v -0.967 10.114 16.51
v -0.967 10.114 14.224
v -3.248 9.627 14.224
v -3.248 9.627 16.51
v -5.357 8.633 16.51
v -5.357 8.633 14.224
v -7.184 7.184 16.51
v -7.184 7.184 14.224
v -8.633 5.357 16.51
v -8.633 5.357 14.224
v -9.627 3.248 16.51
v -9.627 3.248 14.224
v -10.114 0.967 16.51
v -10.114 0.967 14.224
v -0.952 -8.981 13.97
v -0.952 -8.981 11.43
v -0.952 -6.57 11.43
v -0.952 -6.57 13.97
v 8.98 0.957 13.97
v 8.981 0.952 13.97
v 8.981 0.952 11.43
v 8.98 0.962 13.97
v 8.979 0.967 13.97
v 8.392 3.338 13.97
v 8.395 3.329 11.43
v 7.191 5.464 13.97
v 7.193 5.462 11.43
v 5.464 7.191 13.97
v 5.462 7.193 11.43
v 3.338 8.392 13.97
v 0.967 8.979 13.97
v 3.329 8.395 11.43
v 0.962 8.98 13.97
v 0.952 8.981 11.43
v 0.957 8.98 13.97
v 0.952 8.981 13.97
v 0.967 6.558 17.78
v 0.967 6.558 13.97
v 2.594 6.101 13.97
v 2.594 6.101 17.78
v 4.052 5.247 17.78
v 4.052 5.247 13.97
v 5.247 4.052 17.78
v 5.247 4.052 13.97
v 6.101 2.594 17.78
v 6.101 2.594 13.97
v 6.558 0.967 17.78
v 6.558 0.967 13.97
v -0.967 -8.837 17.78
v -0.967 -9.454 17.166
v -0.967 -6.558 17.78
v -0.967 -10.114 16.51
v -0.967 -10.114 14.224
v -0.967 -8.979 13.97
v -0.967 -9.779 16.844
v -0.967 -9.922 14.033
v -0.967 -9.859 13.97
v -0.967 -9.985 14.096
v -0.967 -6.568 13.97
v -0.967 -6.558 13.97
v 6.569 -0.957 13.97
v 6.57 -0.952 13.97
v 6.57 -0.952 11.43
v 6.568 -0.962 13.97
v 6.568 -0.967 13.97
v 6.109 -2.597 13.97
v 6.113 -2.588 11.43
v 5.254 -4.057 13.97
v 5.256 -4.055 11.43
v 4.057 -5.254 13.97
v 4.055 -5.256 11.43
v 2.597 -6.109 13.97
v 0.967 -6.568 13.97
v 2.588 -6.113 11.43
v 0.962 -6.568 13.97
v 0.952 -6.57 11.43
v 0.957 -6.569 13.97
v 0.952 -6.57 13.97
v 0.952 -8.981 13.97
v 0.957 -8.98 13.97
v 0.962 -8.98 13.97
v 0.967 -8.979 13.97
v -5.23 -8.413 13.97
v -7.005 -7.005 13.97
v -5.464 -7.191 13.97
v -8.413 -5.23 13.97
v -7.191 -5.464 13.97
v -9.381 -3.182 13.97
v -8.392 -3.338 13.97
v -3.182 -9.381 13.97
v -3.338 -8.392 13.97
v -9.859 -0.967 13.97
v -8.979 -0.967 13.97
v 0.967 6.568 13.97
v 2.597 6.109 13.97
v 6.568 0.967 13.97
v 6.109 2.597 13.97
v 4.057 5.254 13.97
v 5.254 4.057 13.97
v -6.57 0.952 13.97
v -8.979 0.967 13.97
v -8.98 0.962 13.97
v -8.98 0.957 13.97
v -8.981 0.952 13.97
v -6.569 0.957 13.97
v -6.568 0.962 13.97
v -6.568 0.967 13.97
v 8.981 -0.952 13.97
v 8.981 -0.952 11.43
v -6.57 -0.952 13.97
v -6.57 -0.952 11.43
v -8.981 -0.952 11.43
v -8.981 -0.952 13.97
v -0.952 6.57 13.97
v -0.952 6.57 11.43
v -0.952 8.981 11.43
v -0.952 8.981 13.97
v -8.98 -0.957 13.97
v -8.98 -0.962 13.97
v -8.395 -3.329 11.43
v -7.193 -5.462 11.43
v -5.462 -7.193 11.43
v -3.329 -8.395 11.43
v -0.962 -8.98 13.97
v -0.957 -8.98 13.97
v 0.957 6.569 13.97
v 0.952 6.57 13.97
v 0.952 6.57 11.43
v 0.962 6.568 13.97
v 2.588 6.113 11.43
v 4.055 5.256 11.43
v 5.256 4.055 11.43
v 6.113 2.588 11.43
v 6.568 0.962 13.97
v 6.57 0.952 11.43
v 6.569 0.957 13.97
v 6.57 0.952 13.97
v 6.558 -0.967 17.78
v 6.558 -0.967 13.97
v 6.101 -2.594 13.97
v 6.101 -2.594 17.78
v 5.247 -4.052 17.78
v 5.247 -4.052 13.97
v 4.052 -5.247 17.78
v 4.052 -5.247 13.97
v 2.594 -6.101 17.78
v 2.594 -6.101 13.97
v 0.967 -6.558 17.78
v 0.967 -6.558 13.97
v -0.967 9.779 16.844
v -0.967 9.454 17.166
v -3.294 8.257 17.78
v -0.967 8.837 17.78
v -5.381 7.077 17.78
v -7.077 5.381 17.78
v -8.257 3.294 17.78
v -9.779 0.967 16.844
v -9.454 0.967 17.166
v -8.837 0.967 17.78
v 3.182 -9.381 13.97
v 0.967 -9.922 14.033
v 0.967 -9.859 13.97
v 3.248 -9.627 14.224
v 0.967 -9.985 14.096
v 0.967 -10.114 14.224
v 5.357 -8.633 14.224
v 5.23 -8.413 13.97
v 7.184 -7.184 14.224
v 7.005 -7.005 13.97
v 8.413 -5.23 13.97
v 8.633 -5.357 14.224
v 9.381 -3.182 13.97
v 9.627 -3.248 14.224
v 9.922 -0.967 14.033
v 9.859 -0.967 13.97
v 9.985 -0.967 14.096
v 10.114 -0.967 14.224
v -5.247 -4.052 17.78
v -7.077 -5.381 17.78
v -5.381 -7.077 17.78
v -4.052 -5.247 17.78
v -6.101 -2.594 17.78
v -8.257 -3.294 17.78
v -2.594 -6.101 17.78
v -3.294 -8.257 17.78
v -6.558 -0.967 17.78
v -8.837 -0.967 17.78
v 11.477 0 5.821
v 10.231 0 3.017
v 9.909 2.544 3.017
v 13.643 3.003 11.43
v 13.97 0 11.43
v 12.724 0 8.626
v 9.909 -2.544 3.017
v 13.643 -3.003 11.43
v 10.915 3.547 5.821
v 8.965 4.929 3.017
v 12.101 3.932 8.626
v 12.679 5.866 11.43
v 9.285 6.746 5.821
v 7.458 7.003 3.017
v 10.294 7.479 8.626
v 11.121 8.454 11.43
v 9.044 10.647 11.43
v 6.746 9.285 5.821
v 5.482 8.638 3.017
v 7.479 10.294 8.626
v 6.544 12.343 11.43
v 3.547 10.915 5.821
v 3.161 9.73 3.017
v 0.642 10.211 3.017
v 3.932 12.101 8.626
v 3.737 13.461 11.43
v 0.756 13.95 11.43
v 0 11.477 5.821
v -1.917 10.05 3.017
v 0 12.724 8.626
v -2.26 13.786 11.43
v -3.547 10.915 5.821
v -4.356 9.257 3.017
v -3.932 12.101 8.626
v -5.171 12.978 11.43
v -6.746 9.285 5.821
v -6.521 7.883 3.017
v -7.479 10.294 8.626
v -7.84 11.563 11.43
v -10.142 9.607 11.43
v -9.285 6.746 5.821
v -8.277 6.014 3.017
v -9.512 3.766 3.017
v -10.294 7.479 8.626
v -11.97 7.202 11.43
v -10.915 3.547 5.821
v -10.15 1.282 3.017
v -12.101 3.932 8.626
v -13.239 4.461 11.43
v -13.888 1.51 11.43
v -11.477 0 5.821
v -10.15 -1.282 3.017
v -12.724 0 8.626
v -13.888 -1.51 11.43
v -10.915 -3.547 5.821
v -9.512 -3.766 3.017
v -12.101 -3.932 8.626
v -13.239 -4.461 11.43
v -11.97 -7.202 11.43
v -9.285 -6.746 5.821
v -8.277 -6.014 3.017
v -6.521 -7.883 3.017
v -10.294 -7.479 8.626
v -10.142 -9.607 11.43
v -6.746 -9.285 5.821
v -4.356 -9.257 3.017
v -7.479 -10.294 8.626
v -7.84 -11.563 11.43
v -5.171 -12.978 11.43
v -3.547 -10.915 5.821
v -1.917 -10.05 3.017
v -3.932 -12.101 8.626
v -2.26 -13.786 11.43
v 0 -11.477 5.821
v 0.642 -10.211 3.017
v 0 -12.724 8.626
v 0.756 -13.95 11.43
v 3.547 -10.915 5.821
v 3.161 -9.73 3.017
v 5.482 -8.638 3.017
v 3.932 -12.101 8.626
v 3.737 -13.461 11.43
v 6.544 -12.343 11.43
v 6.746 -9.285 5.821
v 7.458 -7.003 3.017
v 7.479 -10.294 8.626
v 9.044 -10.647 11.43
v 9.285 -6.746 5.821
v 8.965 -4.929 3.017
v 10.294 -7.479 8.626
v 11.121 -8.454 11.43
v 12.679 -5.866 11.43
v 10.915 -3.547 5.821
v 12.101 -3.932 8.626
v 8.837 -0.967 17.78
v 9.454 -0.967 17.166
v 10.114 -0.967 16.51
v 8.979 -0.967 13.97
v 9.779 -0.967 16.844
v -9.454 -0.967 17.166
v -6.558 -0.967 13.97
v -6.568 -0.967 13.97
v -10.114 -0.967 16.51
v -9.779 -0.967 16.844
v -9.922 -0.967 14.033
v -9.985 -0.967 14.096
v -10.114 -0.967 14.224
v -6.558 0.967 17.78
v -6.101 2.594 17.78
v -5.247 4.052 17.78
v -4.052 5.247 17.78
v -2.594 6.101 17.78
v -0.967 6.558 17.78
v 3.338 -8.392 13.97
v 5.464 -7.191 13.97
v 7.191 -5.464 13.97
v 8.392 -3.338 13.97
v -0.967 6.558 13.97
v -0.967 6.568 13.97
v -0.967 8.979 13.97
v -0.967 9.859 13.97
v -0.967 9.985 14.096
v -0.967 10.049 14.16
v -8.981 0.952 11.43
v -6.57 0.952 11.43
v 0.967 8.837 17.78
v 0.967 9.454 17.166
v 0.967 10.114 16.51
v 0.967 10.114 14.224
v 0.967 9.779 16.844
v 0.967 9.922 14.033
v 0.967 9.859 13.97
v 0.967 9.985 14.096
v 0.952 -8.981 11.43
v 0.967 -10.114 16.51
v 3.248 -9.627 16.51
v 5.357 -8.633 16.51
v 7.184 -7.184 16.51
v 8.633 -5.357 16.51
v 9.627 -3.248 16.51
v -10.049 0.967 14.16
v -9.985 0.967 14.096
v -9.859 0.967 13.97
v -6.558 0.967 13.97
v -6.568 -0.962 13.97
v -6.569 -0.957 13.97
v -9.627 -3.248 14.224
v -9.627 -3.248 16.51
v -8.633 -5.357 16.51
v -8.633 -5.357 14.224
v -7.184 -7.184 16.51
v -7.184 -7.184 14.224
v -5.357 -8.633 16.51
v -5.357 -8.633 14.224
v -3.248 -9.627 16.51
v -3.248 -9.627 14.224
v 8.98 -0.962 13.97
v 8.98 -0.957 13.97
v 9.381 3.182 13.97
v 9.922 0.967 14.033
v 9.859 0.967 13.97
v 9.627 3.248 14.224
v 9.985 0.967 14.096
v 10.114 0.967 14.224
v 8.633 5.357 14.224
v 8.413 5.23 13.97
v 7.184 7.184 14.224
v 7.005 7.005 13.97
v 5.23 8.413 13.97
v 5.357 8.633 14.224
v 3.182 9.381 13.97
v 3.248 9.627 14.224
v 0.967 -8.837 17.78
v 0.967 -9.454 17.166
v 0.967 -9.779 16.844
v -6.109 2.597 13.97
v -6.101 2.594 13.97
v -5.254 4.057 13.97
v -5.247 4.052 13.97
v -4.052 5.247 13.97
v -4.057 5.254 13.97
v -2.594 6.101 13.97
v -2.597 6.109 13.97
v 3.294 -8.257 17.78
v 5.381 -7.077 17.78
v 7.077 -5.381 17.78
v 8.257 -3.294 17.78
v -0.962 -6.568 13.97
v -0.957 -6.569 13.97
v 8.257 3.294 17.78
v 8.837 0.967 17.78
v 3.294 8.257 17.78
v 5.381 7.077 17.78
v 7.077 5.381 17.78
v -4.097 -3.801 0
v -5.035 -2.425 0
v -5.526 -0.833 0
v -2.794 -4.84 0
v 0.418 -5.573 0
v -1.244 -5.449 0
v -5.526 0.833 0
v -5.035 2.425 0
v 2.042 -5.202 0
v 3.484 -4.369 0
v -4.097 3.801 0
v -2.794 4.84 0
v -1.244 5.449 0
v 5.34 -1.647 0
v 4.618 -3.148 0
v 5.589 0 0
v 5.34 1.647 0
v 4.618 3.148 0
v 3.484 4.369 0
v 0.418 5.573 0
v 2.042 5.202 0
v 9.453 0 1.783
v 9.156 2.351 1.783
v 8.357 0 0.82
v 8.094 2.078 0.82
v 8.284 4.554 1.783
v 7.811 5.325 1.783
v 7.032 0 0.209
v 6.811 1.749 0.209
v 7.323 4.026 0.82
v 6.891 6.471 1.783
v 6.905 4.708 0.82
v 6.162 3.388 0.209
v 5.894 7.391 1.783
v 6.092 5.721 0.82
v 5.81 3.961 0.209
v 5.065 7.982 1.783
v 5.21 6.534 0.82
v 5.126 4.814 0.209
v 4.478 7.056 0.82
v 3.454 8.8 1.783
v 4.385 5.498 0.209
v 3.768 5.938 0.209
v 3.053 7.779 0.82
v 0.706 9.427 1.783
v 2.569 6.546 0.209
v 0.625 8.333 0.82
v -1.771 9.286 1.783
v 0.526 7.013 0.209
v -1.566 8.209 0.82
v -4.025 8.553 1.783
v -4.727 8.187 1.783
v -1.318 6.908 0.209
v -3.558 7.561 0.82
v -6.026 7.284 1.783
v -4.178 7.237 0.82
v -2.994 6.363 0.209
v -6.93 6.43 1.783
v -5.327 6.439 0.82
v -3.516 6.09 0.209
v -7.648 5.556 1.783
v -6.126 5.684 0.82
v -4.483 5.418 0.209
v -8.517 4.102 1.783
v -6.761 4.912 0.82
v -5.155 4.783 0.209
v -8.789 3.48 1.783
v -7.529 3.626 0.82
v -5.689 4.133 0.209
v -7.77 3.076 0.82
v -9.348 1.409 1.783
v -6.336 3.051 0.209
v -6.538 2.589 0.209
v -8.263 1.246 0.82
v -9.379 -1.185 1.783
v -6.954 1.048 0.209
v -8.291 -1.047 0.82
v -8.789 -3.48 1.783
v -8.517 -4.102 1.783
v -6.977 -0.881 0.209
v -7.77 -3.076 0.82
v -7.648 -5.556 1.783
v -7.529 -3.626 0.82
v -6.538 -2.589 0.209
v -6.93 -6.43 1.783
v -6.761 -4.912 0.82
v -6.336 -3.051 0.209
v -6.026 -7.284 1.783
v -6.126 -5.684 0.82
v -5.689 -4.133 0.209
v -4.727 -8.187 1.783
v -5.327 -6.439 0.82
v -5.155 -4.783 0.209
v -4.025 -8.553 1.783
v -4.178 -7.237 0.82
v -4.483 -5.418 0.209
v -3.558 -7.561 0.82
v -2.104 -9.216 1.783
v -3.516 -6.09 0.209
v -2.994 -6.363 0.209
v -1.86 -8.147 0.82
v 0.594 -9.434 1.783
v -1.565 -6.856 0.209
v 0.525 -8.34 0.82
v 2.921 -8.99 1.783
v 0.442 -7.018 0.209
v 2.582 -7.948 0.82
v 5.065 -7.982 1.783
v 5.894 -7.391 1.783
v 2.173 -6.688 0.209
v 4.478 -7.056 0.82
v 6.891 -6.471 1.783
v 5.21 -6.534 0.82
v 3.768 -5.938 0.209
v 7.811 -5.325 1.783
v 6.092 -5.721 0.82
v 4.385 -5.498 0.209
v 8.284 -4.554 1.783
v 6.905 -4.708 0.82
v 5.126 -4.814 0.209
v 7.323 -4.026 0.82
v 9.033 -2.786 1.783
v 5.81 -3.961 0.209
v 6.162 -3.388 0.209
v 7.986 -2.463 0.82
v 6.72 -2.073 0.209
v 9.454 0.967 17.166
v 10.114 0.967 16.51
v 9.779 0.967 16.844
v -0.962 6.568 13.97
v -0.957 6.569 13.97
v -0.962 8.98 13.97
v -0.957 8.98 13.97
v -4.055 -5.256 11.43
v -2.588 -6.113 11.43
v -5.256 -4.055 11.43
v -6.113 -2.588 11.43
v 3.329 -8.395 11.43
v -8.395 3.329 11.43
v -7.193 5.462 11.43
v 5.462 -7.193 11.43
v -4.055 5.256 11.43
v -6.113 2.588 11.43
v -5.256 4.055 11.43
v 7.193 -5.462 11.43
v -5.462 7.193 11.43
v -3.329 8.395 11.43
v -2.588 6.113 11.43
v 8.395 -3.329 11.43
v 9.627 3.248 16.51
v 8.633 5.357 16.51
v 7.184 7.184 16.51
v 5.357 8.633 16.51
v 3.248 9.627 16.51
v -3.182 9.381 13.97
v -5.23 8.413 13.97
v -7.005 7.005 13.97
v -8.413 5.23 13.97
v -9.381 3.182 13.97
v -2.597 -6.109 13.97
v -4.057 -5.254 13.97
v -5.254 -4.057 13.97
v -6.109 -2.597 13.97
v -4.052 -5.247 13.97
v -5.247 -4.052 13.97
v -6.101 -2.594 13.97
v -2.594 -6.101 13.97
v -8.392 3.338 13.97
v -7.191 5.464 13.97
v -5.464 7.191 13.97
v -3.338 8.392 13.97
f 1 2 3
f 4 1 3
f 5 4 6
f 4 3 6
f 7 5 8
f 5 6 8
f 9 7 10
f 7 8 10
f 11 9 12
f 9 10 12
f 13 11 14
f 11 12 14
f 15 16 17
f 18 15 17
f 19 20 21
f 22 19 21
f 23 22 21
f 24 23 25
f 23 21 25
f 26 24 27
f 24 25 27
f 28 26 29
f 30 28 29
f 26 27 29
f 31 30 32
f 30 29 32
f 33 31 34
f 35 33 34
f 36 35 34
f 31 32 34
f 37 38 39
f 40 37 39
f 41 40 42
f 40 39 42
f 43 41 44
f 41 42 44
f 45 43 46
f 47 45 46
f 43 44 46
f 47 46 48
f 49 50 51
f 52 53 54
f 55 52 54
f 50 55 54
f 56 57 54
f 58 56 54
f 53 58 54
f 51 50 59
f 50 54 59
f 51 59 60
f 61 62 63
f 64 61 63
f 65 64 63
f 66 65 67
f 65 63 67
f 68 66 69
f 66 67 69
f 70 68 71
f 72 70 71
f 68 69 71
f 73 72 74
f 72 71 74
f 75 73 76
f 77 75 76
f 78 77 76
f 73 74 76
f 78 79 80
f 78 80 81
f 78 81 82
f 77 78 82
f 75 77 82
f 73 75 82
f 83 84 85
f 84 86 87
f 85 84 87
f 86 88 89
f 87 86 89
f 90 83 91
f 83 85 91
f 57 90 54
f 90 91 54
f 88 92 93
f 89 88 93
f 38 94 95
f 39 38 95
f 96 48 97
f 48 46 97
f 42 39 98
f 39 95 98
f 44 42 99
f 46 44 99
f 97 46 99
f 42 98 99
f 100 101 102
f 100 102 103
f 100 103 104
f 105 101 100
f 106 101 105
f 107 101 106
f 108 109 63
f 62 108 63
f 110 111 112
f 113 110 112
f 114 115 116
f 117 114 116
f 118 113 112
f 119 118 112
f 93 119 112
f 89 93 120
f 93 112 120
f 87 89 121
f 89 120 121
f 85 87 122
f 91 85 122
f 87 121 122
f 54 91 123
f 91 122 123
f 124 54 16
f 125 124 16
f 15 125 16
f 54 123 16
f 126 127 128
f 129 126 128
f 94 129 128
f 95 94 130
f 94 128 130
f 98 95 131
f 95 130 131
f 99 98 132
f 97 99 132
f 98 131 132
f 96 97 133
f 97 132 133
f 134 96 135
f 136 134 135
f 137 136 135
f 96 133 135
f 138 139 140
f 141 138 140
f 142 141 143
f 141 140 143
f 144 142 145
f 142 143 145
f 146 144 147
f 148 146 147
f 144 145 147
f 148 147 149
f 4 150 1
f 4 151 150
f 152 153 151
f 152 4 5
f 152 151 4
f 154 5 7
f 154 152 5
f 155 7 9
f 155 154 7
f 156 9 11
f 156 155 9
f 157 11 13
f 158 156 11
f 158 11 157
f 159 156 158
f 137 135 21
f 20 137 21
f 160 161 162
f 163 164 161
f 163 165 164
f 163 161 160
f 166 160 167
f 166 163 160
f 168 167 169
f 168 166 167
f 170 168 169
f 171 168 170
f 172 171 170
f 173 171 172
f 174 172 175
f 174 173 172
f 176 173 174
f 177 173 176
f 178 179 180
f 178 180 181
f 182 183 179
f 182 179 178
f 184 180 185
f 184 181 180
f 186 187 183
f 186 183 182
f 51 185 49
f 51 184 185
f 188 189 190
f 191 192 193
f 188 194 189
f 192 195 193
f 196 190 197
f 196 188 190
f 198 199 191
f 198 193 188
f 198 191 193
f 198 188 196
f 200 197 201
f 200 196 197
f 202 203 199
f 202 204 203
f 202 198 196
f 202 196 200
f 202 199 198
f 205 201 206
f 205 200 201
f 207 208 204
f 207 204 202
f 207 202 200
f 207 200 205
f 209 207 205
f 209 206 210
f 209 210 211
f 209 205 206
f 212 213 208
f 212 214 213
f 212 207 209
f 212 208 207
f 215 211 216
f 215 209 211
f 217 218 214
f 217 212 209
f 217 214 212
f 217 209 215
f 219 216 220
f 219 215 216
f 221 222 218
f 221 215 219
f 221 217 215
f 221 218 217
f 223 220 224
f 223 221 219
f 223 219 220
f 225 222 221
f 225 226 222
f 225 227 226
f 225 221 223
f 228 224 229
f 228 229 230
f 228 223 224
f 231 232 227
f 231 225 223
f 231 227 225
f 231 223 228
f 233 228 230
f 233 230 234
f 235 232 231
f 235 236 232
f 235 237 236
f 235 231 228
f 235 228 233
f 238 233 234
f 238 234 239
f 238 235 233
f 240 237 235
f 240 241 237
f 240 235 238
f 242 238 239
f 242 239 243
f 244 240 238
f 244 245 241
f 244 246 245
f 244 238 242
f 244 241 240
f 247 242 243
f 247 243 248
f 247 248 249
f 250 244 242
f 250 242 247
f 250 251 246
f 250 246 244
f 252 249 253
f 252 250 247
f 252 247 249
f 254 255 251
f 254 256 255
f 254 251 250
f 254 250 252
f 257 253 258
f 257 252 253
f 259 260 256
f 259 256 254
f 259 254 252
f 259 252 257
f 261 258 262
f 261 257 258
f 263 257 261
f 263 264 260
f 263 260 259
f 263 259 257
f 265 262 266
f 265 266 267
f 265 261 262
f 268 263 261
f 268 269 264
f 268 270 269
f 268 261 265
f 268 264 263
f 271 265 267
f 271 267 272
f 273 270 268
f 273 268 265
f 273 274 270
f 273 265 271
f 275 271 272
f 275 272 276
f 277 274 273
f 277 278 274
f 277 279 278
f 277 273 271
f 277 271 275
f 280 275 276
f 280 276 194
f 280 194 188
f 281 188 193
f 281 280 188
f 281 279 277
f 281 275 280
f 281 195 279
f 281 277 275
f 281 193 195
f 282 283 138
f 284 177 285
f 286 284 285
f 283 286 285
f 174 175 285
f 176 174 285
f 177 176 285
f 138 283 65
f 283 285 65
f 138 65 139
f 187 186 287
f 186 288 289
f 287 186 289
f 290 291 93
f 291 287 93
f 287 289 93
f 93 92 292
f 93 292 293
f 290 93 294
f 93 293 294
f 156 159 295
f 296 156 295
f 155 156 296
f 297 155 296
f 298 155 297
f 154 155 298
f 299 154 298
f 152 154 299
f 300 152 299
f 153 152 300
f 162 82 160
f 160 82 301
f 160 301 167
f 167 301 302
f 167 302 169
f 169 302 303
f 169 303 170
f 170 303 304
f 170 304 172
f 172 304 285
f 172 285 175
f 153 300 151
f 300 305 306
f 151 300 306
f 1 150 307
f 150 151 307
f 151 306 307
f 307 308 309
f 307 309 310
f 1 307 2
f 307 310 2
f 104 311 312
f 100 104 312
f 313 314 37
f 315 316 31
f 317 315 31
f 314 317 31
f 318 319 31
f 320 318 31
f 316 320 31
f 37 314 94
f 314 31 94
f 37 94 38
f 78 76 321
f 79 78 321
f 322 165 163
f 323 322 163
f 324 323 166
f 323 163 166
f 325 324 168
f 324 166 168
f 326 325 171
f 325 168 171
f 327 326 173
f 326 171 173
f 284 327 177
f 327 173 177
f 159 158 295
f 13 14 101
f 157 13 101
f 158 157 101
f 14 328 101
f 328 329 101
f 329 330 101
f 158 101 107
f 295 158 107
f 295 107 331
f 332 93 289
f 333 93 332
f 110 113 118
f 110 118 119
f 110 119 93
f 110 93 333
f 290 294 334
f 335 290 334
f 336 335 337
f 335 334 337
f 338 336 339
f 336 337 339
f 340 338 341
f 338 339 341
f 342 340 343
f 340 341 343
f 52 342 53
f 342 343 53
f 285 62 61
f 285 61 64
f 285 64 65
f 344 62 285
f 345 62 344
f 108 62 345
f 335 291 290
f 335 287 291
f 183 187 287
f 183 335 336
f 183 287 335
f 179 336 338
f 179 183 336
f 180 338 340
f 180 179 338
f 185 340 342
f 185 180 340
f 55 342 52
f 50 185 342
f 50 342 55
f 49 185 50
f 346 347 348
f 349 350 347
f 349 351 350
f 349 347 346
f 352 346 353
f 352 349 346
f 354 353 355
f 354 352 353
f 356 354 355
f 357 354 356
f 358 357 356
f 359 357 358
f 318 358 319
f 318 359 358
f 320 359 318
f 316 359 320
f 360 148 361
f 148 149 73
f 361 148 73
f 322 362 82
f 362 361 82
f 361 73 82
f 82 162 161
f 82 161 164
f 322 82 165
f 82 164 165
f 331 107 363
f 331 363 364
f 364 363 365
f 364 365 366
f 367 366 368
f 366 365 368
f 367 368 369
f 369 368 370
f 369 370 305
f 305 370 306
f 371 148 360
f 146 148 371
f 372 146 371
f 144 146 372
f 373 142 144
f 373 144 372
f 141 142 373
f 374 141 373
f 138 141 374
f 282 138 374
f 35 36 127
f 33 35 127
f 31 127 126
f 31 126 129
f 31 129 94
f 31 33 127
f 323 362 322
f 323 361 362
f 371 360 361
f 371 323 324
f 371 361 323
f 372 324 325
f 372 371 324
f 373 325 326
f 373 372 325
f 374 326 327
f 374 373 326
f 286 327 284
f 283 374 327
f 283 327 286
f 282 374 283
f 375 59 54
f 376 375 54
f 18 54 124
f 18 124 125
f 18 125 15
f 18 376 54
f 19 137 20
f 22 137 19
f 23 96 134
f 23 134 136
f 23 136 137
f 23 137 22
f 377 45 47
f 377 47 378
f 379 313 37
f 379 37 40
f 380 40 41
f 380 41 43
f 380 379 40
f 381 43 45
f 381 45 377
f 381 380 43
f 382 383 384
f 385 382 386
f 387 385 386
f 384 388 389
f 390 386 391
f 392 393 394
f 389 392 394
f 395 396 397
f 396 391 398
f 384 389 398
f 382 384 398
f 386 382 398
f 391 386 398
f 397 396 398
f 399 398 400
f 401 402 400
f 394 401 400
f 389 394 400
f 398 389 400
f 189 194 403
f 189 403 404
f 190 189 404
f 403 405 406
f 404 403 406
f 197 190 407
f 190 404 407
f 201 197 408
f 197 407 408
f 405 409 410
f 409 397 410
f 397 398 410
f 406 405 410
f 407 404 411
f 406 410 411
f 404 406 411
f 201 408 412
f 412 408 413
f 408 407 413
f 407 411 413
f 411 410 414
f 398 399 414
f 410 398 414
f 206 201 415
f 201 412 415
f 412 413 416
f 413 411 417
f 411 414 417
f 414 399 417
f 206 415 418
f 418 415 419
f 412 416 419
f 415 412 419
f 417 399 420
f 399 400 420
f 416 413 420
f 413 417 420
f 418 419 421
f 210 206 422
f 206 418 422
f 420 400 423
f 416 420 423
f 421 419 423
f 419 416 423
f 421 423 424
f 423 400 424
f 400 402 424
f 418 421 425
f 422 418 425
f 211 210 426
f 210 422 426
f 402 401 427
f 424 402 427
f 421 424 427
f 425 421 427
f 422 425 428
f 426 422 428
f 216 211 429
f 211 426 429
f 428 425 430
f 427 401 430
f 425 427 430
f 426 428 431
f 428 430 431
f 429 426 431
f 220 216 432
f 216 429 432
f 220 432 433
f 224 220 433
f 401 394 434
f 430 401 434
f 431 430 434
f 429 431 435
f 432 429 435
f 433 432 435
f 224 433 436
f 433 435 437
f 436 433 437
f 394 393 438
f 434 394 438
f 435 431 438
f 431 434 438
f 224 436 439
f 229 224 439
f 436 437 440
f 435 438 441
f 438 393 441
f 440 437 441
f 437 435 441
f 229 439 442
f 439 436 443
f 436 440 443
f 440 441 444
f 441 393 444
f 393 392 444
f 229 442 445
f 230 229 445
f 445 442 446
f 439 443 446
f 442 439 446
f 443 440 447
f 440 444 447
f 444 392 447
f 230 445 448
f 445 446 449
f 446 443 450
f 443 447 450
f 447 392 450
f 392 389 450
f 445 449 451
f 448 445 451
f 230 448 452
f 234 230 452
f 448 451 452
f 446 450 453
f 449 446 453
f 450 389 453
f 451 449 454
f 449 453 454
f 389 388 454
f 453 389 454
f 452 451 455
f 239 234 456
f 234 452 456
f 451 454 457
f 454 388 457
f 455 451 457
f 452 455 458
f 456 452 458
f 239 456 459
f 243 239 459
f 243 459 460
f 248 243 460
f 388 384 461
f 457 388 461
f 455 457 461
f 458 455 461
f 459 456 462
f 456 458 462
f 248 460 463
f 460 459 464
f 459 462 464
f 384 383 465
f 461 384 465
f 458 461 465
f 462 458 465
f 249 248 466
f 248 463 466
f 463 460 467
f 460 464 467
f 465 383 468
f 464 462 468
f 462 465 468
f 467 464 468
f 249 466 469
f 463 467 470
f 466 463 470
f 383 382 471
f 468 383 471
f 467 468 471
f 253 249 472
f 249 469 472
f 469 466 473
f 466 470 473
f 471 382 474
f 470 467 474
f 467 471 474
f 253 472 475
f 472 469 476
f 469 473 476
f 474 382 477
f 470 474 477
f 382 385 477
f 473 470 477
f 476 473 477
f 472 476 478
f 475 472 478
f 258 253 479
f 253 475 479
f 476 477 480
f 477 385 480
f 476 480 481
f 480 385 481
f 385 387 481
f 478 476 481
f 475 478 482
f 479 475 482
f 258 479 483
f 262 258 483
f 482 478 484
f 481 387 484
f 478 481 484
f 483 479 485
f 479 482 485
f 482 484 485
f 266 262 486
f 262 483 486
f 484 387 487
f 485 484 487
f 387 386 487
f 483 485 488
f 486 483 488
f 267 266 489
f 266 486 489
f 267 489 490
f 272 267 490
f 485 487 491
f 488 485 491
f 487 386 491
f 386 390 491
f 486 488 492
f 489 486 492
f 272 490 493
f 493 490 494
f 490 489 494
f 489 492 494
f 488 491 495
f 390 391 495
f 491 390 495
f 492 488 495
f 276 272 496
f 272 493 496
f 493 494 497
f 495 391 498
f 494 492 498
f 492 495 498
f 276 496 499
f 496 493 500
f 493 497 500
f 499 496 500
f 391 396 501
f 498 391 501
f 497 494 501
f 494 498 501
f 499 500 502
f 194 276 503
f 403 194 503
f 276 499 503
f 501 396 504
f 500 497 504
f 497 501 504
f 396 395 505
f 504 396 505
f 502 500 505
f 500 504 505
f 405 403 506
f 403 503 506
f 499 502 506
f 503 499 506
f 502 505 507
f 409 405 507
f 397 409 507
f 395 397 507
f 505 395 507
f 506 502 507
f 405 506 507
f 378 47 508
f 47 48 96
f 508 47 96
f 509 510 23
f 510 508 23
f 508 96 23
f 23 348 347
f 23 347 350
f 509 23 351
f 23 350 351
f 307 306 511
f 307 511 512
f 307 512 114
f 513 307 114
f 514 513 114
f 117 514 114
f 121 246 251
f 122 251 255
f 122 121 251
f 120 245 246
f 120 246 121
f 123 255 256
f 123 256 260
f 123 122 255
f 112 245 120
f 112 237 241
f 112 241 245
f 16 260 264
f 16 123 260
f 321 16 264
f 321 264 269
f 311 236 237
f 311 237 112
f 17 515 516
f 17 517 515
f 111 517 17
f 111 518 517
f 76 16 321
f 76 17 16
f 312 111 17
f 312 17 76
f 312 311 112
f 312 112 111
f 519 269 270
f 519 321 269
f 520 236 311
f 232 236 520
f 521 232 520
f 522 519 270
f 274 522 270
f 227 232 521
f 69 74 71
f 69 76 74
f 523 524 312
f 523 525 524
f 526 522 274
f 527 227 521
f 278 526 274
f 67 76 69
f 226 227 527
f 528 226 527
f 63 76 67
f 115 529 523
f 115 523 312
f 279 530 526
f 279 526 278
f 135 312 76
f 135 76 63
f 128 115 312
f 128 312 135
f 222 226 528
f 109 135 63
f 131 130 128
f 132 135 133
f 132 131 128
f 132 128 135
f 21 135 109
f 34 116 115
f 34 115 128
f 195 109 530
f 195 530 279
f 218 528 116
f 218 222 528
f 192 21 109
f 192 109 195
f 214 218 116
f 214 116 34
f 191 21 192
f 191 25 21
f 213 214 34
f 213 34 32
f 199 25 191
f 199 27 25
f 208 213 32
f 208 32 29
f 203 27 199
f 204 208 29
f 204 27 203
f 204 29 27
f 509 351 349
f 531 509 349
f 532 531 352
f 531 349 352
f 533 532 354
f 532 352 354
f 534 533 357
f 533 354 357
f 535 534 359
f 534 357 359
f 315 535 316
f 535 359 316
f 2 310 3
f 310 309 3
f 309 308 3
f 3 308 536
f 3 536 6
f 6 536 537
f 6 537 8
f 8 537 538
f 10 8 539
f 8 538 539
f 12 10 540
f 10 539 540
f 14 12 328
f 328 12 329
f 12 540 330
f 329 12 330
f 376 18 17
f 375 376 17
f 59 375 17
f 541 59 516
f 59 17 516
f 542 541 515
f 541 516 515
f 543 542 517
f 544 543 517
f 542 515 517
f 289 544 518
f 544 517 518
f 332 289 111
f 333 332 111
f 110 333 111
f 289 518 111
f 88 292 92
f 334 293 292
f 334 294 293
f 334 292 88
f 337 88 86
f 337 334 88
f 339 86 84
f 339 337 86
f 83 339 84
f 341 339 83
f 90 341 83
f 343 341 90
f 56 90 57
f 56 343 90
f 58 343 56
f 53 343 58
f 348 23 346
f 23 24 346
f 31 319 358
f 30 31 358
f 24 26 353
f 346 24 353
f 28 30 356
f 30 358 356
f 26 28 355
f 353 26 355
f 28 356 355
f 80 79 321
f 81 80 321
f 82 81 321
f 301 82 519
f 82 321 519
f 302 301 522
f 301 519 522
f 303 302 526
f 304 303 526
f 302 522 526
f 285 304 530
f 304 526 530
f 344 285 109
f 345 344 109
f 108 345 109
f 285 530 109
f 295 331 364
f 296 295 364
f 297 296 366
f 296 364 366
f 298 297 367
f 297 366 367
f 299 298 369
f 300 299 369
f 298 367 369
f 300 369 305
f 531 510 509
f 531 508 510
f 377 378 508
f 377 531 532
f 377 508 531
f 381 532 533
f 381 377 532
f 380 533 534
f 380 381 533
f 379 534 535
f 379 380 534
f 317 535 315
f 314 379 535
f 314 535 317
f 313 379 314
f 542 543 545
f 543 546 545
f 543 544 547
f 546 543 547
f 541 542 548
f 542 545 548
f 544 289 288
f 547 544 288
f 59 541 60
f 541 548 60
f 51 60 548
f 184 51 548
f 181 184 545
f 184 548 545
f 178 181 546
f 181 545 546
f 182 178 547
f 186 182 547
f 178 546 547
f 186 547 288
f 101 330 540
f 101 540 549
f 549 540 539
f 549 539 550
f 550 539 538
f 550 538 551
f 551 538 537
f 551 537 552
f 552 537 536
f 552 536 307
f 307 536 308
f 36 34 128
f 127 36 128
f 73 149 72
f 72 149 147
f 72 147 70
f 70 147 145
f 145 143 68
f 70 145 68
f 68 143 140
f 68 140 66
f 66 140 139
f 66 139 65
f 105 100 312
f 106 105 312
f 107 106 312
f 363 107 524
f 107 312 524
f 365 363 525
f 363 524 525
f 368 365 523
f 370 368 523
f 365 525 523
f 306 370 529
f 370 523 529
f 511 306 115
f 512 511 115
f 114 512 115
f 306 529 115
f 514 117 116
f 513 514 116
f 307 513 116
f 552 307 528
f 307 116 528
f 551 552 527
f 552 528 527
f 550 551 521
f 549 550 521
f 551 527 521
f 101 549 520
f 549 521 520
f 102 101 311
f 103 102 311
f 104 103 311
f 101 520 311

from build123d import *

# Parameters (mm, degrees)
F1_R     = 8.89
F2_R     = 13.97
F5_R     = 5.08
F7_DEPTH = 2.54
F9_DEPTH = 3.81
F10_SIZE = 1.27
F11_SIZE = 0.254


with BuildPart() as f4:
    # F1 (on Top) → F4 section 0
    with BuildSketch(Plane.XY):
        Circle(F1_R)
    # F2 (on offset) → F4 section 1
    with BuildSketch(Plane.XY.offset(11.43)):
        Circle(F2_R)
    loft()

    # F5
    f5_edges = [f4.edges().sort_by_distance(p)[0] for p in [
        (-8.89, 0, 0),
    ]]
    fillet(f5_edges, radius=F5_R)

    # F6 (on offset) → F7 (join)
    with BuildSketch(Plane.XY.offset(11.43)):
        with BuildLine():
            Line((-0.9525, 6.5696794791), (-0.9525, 8.9808006413))
            ThreePointArc((-0.9525, 8.9808006413), (-6.3860017386, 6.3860017386), (-8.9808006413, 0.9525))
            Line((-8.9808006413, 0.9525), (-6.5696794791, 0.9525))
            ThreePointArc((-6.5696794791, 0.9525), (-4.694035828, 4.694035828), (-0.9525, 6.5696794791))
        make_face()
        with BuildLine():
            ThreePointArc((-0.9525, -6.5696794791), (-4.694035828, -4.694035828), (-6.5696794791, -0.9525))
            Line((-6.5696794791, -0.9525), (-8.9808006413, -0.9525))
            ThreePointArc((-8.9808006413, -0.9525), (-6.3860017386, -6.3860017386), (-0.9525, -8.9808006413))
            Line((-0.9525, -8.9808006413), (-0.9525, -6.5696794791))
        make_face()
        with BuildLine():
            ThreePointArc((0.9525, -8.9808006413), (6.3860017386, -6.3860017386), (8.9808006413, -0.9525))
            Line((8.9808006413, -0.9525), (6.5696794791, -0.9525))
            ThreePointArc((6.5696794791, -0.9525), (4.694035828, -4.694035828), (0.9525, -6.5696794791))
            Line((0.9525, -6.5696794791), (0.9525, -8.9808006413))
        make_face()
        with BuildLine():
            Line((6.5696794791, 0.9525), (8.9808006413, 0.9525))
            ThreePointArc((8.9808006413, 0.9525), (6.3860017386, 6.3860017386), (0.9525, 8.9808006413))
            Line((0.9525, 8.9808006413), (0.9525, 6.5696794791))
            ThreePointArc((0.9525, 6.5696794791), (4.694035828, 4.694035828), (6.5696794791, 0.9525))
        make_face()
    extrude(amount=F7_DEPTH)

    # F8 (on offset) → F9 (join)
    with BuildSketch(Plane.XY.offset(13.97)):
        with BuildLine():
            Line((-0.9671329128, 6.5584753021), (-0.9671329128, 10.1138644409))
            ThreePointArc((-0.9671329128, 10.1138644409), (-7.1842048969, 7.1842048969), (-10.1138644409, 0.9671329128))
            Line((-10.1138644409, 0.9671329128), (-6.5584753021, 0.9671329128))
            ThreePointArc((-6.5584753021, 0.9671329128), (-4.6876936952, 4.6876936952), (-0.9671329128, 6.5584753021))
        make_face()
        with BuildLine():
            ThreePointArc((10.1138644409, 0.9671329128), (7.1842048969, 7.1842048969), (0.9671329128, 10.1138644409))
            Line((0.9671329128, 10.1138644409), (0.9671329128, 6.5584753021))
            ThreePointArc((0.9671329128, 6.5584753021), (4.6876936952, 4.6876936952), (6.5584753021, 0.9671329128))
            Line((6.5584753021, 0.9671329128), (10.1138644409, 0.9671329128))
        make_face()
        with BuildLine():
            ThreePointArc((0.9671329128, -10.1138644409), (7.1842048969, -7.1842048969), (10.1138644409, -0.9671329128))
            Line((10.1138644409, -0.9671329128), (6.5584753021, -0.9671329128))
            ThreePointArc((6.5584753021, -0.9671329128), (4.6876936952, -4.6876936952), (0.9671329128, -6.5584753021))
            Line((0.9671329128, -6.5584753021), (0.9671329128, -10.1138644409))
        make_face()
        with BuildLine():
            Line((-6.5584753021, -0.9671329128), (-10.1138644409, -0.9671329128))
            ThreePointArc((-10.1138644409, -0.9671329128), (-7.1842048969, -7.1842048969), (-0.9671329128, -10.1138644409))
            Line((-0.9671329128, -10.1138644409), (-0.9671329128, -6.5584753021))
            ThreePointArc((-0.9671329128, -6.5584753021), (-4.6876936952, -4.6876936952), (-6.5584753021, -0.9671329128))
        make_face()
    extrude(amount=F9_DEPTH)

    # F10
    f10_edges = [f4.edges().sort_by_distance(p)[0] for p in [
        (-7.184205, -7.184205, 17.78),
        (7.184205, -7.184205, 17.78),
        (7.184205, 7.184205, 17.78),
        (-7.184205, 7.184205, 17.78),
    ]]
    chamfer(f10_edges, length=F10_SIZE)

    # F11
    f11_edges = [f4.edges().sort_by_distance(p)[0] for p in [
        (-7.184205, -7.184205, 13.97),
        (-7.184205, 7.184205, 13.97),
        (7.184205, -7.184205, 13.97),
        (7.184205, 7.184205, 13.97),
    ]]
    chamfer(f11_edges, length=F11_SIZE)


solid = f4.part
